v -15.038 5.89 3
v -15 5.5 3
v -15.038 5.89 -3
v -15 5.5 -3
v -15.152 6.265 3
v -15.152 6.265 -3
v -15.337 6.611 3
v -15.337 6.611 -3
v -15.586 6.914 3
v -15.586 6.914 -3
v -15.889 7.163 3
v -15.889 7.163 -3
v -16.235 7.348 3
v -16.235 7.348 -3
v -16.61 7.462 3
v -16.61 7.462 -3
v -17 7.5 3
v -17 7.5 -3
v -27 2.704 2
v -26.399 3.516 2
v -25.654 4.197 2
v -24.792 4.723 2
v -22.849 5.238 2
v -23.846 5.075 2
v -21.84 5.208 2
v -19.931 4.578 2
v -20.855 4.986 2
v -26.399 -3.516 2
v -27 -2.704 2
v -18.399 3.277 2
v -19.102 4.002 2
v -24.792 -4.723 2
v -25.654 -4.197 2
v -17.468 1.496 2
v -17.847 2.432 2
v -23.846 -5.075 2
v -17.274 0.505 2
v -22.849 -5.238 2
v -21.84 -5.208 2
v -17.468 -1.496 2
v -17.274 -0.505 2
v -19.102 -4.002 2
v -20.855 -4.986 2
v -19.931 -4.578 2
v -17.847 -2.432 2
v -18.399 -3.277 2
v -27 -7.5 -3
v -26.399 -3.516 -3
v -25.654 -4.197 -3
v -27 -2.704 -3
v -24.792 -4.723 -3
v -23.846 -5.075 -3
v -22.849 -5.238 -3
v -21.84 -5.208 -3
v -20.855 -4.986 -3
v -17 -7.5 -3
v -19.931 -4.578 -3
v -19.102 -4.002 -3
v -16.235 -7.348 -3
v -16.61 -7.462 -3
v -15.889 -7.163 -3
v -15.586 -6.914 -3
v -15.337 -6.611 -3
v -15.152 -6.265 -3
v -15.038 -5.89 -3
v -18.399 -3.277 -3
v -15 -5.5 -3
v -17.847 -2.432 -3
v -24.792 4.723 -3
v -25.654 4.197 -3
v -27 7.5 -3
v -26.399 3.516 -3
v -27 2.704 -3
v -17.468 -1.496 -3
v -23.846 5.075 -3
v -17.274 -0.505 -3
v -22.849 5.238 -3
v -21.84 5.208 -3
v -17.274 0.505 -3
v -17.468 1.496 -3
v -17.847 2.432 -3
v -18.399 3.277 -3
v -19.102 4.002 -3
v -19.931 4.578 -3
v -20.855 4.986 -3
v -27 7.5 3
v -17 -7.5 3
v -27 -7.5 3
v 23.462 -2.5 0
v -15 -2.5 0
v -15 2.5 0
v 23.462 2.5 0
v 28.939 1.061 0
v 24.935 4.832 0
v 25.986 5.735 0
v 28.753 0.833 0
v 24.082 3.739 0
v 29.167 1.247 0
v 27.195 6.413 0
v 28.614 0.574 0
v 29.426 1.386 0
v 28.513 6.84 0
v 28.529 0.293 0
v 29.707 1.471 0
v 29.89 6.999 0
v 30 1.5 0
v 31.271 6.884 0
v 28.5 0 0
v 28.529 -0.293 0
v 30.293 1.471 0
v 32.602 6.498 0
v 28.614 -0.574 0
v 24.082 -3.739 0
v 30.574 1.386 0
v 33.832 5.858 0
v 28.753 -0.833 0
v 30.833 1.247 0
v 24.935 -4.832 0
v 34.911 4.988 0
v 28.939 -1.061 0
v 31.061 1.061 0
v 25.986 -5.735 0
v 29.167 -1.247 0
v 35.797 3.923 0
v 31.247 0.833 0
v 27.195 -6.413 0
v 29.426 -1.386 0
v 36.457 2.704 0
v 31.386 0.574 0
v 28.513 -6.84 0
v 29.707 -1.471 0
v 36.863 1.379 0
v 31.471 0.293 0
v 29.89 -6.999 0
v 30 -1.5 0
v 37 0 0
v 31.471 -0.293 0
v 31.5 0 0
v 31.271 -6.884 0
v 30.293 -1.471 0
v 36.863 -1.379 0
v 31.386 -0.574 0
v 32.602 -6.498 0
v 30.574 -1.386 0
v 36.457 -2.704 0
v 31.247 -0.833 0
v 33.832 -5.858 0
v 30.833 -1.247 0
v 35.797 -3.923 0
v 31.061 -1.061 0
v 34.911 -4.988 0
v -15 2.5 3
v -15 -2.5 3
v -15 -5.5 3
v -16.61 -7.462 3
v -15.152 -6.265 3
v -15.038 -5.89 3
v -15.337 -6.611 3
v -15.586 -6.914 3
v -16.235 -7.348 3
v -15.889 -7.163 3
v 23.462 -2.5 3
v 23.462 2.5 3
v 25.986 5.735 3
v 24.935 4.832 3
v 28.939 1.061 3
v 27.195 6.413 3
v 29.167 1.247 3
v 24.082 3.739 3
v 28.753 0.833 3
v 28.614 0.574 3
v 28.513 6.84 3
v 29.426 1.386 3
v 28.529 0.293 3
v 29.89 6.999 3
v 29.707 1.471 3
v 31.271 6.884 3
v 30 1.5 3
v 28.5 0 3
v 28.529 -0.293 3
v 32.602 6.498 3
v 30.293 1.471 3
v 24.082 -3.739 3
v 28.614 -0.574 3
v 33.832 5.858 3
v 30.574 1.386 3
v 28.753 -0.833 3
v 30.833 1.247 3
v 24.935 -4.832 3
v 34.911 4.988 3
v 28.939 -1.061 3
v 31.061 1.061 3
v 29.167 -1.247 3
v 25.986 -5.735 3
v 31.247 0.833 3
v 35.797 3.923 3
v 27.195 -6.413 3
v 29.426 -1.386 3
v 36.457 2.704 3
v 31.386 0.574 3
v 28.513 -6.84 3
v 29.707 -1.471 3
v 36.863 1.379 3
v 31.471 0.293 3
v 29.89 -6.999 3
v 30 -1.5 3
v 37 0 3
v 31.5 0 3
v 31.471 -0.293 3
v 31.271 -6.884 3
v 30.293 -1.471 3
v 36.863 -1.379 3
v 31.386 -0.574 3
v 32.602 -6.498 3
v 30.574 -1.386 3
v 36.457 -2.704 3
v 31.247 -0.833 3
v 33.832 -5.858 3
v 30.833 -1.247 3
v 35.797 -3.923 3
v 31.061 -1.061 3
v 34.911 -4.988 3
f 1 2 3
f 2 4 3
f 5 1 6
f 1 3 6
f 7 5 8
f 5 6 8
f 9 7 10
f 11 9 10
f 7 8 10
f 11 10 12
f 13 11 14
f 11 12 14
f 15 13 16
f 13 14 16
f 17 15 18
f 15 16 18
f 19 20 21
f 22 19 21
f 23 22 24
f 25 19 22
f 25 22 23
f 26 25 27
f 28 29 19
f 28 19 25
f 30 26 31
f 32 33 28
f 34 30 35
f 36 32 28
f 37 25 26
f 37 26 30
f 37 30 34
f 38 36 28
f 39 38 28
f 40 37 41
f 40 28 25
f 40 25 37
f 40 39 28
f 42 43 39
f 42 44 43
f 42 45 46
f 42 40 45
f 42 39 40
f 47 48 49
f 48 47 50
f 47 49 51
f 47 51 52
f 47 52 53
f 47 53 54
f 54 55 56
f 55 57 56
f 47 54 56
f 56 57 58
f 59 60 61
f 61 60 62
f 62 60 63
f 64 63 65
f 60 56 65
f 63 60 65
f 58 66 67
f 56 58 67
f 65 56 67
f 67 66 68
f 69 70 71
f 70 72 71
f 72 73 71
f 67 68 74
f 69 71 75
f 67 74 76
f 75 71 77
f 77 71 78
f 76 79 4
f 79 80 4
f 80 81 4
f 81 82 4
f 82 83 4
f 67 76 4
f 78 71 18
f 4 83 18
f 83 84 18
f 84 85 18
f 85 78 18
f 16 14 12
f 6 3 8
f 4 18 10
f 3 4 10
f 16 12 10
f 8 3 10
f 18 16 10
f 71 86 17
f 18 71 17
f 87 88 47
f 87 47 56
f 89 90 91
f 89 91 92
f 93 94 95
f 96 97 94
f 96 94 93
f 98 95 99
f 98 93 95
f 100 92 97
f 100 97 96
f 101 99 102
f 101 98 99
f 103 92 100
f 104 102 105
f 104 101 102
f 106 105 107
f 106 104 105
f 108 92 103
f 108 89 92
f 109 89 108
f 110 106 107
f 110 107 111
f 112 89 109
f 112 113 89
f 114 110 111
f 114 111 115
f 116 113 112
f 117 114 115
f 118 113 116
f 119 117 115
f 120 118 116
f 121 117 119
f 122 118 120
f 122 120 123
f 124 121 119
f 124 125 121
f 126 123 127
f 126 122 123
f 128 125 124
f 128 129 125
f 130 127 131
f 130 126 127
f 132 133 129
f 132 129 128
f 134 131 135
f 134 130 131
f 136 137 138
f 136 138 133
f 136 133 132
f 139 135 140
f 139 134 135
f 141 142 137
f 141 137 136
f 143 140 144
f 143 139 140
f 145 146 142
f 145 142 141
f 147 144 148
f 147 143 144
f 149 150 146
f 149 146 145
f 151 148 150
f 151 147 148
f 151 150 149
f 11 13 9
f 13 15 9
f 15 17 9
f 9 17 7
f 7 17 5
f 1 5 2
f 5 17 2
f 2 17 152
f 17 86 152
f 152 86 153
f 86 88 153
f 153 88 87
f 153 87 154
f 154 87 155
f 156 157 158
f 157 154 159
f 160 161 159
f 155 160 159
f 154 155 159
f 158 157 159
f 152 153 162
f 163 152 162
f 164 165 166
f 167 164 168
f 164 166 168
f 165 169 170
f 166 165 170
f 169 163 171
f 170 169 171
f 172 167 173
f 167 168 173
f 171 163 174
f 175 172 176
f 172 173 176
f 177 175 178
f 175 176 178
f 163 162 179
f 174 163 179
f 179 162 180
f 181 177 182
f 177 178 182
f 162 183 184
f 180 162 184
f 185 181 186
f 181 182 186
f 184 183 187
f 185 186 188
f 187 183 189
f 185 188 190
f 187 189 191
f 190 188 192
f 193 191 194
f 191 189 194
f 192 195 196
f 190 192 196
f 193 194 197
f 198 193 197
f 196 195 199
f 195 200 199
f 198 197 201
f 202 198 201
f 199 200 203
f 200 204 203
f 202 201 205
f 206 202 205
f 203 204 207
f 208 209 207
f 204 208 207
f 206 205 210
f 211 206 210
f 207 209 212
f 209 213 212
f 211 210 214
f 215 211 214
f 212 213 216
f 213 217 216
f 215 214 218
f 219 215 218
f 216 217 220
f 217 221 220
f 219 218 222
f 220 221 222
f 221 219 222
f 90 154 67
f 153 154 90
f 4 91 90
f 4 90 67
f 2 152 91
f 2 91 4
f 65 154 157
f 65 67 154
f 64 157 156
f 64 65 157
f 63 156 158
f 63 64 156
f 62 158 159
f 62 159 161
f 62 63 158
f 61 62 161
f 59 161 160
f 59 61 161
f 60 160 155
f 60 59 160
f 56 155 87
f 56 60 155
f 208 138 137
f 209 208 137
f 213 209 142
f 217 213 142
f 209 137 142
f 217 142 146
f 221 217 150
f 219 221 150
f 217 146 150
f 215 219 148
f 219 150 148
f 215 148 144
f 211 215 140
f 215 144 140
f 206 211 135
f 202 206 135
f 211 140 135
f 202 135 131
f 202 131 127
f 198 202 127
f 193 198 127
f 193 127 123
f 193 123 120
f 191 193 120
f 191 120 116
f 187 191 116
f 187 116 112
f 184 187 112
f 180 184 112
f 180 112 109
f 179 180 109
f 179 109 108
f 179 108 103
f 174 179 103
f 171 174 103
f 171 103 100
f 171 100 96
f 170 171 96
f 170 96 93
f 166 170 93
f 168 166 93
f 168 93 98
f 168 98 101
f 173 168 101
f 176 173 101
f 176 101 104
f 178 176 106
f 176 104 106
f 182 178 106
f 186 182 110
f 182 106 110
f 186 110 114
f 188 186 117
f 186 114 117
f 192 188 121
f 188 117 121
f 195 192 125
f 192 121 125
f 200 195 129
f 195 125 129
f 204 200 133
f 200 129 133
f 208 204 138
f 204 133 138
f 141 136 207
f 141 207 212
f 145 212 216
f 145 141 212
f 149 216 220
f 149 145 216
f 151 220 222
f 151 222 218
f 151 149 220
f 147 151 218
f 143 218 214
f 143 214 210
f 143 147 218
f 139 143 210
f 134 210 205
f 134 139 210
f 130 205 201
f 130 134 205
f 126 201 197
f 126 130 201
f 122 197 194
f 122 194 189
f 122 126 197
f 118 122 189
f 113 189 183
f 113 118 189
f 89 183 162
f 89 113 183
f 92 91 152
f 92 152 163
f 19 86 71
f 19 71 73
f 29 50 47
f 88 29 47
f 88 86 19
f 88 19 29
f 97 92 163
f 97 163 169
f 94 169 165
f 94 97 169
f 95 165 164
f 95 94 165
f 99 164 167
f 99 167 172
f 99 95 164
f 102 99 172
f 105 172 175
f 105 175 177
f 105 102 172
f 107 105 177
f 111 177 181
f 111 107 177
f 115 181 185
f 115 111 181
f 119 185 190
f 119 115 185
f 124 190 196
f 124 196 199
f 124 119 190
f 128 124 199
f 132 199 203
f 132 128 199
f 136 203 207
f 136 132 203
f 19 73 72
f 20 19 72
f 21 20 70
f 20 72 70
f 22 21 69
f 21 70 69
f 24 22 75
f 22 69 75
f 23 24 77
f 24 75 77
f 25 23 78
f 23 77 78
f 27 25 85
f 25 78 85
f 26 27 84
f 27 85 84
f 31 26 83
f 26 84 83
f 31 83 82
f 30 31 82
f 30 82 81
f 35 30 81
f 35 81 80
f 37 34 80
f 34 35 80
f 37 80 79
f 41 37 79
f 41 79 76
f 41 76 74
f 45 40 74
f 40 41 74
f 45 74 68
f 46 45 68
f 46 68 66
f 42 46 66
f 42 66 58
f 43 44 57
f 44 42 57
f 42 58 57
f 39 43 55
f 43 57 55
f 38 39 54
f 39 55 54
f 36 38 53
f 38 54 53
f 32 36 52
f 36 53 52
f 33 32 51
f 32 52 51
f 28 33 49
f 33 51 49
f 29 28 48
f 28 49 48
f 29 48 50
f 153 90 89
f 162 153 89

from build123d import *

# Parameters (mm, degrees)
F0_W      = 60
F0_H      = 5
F1_DEPTH  = 3
F2_W      = 15
F2_H      = 5
F3_DEPTH  = 6
F4_R      = 5.25
F5_DEPTH  = 5
F6_DEPTH  = 3
F8_DEPTH  = 3
F9_R      = 1.5
F10_DEPTH = 25
F11_R     = 2


with BuildPart() as f1:
    # F0 (on Top) → F1 (new body)
    with BuildSketch(Plane.XY):
        Rectangle(F0_W, F0_H)
    extrude(amount=F1_DEPTH)

    # F2 (on face) → F3 (join)
    with BuildSketch(Plane.XY.offset(3)):
        with Locations((-22.5, 5)):
            Rectangle(F2_W, F2_H)
        with Locations((-22.5, 0)):
            Rectangle(F2_W, F2_H)
        with Locations((-22.5, -5)):
            Rectangle(F2_W, F2_H)
    extrude(amount=-F3_DEPTH)

    # F4 (on face) → F5 (cut)
    with BuildSketch(Plane(origin=(0, 0, -3), x_dir=(1, 0, 0), z_dir=(0, 0, -1))):
        with Locations((-22.5, 0)):
            Circle(F4_R)
    extrude(amount=-F5_DEPTH, mode=Mode.SUBTRACT)

    # F6 (cut): a face of the model
    f6_faces = [f1.faces().sort_by_distance(p)[0] for p in [
        (-30, 0, 0),
    ]]
    extrude(f6_faces, amount=-F6_DEPTH, mode=Mode.SUBTRACT)

    # F7 (on face) → F8 (join)
    with BuildSketch(Plane(origin=(0, 0, 0), x_dir=(1, 0, 0), z_dir=(0, 0, -1))):
        with BuildLine():
            ThreePointArc((23.4616515847, -2.5), (31.2711335675, -6.8836196477), (37, 0))
            ThreePointArc((37, 0), (31.2711335675, 6.8836196477), (23.4616515847, 2.5))
            Line((23.4616515847, 2.5), (30, 2.5))
            Line((30, 2.5), (30, -2.5))
            Line((30, -2.5), (23.4616515847, -2.5))
        make_face()
        with BuildLine():
            Line((30, 2.5), (23.4616515847, 2.5))
            ThreePointArc((23.4616515847, 2.5), (23, 0), (23.4616515847, -2.5))
            Line((23.4616515847, -2.5), (30, -2.5))
            Line((30, -2.5), (30, 2.5))
        make_face()
    extrude(amount=-F8_DEPTH)

    # F9 (on face) → F10 (cut)
    with BuildSketch(Plane(origin=(0, 0, 0), x_dir=(1, 0, 0), z_dir=(0, 0, -1))):
        with Locations((30, 0)):
            Circle(F9_R)
    extrude(amount=-F10_DEPTH, mode=Mode.SUBTRACT)

    # F11
    f11_edges = [f1.edges().sort_by_distance(p)[0] for p in [
        (-15, -7.5, 0),
        (-15, 7.5, 0),
    ]]
    fillet(f11_edges, radius=F11_R)


solid = f1.part
